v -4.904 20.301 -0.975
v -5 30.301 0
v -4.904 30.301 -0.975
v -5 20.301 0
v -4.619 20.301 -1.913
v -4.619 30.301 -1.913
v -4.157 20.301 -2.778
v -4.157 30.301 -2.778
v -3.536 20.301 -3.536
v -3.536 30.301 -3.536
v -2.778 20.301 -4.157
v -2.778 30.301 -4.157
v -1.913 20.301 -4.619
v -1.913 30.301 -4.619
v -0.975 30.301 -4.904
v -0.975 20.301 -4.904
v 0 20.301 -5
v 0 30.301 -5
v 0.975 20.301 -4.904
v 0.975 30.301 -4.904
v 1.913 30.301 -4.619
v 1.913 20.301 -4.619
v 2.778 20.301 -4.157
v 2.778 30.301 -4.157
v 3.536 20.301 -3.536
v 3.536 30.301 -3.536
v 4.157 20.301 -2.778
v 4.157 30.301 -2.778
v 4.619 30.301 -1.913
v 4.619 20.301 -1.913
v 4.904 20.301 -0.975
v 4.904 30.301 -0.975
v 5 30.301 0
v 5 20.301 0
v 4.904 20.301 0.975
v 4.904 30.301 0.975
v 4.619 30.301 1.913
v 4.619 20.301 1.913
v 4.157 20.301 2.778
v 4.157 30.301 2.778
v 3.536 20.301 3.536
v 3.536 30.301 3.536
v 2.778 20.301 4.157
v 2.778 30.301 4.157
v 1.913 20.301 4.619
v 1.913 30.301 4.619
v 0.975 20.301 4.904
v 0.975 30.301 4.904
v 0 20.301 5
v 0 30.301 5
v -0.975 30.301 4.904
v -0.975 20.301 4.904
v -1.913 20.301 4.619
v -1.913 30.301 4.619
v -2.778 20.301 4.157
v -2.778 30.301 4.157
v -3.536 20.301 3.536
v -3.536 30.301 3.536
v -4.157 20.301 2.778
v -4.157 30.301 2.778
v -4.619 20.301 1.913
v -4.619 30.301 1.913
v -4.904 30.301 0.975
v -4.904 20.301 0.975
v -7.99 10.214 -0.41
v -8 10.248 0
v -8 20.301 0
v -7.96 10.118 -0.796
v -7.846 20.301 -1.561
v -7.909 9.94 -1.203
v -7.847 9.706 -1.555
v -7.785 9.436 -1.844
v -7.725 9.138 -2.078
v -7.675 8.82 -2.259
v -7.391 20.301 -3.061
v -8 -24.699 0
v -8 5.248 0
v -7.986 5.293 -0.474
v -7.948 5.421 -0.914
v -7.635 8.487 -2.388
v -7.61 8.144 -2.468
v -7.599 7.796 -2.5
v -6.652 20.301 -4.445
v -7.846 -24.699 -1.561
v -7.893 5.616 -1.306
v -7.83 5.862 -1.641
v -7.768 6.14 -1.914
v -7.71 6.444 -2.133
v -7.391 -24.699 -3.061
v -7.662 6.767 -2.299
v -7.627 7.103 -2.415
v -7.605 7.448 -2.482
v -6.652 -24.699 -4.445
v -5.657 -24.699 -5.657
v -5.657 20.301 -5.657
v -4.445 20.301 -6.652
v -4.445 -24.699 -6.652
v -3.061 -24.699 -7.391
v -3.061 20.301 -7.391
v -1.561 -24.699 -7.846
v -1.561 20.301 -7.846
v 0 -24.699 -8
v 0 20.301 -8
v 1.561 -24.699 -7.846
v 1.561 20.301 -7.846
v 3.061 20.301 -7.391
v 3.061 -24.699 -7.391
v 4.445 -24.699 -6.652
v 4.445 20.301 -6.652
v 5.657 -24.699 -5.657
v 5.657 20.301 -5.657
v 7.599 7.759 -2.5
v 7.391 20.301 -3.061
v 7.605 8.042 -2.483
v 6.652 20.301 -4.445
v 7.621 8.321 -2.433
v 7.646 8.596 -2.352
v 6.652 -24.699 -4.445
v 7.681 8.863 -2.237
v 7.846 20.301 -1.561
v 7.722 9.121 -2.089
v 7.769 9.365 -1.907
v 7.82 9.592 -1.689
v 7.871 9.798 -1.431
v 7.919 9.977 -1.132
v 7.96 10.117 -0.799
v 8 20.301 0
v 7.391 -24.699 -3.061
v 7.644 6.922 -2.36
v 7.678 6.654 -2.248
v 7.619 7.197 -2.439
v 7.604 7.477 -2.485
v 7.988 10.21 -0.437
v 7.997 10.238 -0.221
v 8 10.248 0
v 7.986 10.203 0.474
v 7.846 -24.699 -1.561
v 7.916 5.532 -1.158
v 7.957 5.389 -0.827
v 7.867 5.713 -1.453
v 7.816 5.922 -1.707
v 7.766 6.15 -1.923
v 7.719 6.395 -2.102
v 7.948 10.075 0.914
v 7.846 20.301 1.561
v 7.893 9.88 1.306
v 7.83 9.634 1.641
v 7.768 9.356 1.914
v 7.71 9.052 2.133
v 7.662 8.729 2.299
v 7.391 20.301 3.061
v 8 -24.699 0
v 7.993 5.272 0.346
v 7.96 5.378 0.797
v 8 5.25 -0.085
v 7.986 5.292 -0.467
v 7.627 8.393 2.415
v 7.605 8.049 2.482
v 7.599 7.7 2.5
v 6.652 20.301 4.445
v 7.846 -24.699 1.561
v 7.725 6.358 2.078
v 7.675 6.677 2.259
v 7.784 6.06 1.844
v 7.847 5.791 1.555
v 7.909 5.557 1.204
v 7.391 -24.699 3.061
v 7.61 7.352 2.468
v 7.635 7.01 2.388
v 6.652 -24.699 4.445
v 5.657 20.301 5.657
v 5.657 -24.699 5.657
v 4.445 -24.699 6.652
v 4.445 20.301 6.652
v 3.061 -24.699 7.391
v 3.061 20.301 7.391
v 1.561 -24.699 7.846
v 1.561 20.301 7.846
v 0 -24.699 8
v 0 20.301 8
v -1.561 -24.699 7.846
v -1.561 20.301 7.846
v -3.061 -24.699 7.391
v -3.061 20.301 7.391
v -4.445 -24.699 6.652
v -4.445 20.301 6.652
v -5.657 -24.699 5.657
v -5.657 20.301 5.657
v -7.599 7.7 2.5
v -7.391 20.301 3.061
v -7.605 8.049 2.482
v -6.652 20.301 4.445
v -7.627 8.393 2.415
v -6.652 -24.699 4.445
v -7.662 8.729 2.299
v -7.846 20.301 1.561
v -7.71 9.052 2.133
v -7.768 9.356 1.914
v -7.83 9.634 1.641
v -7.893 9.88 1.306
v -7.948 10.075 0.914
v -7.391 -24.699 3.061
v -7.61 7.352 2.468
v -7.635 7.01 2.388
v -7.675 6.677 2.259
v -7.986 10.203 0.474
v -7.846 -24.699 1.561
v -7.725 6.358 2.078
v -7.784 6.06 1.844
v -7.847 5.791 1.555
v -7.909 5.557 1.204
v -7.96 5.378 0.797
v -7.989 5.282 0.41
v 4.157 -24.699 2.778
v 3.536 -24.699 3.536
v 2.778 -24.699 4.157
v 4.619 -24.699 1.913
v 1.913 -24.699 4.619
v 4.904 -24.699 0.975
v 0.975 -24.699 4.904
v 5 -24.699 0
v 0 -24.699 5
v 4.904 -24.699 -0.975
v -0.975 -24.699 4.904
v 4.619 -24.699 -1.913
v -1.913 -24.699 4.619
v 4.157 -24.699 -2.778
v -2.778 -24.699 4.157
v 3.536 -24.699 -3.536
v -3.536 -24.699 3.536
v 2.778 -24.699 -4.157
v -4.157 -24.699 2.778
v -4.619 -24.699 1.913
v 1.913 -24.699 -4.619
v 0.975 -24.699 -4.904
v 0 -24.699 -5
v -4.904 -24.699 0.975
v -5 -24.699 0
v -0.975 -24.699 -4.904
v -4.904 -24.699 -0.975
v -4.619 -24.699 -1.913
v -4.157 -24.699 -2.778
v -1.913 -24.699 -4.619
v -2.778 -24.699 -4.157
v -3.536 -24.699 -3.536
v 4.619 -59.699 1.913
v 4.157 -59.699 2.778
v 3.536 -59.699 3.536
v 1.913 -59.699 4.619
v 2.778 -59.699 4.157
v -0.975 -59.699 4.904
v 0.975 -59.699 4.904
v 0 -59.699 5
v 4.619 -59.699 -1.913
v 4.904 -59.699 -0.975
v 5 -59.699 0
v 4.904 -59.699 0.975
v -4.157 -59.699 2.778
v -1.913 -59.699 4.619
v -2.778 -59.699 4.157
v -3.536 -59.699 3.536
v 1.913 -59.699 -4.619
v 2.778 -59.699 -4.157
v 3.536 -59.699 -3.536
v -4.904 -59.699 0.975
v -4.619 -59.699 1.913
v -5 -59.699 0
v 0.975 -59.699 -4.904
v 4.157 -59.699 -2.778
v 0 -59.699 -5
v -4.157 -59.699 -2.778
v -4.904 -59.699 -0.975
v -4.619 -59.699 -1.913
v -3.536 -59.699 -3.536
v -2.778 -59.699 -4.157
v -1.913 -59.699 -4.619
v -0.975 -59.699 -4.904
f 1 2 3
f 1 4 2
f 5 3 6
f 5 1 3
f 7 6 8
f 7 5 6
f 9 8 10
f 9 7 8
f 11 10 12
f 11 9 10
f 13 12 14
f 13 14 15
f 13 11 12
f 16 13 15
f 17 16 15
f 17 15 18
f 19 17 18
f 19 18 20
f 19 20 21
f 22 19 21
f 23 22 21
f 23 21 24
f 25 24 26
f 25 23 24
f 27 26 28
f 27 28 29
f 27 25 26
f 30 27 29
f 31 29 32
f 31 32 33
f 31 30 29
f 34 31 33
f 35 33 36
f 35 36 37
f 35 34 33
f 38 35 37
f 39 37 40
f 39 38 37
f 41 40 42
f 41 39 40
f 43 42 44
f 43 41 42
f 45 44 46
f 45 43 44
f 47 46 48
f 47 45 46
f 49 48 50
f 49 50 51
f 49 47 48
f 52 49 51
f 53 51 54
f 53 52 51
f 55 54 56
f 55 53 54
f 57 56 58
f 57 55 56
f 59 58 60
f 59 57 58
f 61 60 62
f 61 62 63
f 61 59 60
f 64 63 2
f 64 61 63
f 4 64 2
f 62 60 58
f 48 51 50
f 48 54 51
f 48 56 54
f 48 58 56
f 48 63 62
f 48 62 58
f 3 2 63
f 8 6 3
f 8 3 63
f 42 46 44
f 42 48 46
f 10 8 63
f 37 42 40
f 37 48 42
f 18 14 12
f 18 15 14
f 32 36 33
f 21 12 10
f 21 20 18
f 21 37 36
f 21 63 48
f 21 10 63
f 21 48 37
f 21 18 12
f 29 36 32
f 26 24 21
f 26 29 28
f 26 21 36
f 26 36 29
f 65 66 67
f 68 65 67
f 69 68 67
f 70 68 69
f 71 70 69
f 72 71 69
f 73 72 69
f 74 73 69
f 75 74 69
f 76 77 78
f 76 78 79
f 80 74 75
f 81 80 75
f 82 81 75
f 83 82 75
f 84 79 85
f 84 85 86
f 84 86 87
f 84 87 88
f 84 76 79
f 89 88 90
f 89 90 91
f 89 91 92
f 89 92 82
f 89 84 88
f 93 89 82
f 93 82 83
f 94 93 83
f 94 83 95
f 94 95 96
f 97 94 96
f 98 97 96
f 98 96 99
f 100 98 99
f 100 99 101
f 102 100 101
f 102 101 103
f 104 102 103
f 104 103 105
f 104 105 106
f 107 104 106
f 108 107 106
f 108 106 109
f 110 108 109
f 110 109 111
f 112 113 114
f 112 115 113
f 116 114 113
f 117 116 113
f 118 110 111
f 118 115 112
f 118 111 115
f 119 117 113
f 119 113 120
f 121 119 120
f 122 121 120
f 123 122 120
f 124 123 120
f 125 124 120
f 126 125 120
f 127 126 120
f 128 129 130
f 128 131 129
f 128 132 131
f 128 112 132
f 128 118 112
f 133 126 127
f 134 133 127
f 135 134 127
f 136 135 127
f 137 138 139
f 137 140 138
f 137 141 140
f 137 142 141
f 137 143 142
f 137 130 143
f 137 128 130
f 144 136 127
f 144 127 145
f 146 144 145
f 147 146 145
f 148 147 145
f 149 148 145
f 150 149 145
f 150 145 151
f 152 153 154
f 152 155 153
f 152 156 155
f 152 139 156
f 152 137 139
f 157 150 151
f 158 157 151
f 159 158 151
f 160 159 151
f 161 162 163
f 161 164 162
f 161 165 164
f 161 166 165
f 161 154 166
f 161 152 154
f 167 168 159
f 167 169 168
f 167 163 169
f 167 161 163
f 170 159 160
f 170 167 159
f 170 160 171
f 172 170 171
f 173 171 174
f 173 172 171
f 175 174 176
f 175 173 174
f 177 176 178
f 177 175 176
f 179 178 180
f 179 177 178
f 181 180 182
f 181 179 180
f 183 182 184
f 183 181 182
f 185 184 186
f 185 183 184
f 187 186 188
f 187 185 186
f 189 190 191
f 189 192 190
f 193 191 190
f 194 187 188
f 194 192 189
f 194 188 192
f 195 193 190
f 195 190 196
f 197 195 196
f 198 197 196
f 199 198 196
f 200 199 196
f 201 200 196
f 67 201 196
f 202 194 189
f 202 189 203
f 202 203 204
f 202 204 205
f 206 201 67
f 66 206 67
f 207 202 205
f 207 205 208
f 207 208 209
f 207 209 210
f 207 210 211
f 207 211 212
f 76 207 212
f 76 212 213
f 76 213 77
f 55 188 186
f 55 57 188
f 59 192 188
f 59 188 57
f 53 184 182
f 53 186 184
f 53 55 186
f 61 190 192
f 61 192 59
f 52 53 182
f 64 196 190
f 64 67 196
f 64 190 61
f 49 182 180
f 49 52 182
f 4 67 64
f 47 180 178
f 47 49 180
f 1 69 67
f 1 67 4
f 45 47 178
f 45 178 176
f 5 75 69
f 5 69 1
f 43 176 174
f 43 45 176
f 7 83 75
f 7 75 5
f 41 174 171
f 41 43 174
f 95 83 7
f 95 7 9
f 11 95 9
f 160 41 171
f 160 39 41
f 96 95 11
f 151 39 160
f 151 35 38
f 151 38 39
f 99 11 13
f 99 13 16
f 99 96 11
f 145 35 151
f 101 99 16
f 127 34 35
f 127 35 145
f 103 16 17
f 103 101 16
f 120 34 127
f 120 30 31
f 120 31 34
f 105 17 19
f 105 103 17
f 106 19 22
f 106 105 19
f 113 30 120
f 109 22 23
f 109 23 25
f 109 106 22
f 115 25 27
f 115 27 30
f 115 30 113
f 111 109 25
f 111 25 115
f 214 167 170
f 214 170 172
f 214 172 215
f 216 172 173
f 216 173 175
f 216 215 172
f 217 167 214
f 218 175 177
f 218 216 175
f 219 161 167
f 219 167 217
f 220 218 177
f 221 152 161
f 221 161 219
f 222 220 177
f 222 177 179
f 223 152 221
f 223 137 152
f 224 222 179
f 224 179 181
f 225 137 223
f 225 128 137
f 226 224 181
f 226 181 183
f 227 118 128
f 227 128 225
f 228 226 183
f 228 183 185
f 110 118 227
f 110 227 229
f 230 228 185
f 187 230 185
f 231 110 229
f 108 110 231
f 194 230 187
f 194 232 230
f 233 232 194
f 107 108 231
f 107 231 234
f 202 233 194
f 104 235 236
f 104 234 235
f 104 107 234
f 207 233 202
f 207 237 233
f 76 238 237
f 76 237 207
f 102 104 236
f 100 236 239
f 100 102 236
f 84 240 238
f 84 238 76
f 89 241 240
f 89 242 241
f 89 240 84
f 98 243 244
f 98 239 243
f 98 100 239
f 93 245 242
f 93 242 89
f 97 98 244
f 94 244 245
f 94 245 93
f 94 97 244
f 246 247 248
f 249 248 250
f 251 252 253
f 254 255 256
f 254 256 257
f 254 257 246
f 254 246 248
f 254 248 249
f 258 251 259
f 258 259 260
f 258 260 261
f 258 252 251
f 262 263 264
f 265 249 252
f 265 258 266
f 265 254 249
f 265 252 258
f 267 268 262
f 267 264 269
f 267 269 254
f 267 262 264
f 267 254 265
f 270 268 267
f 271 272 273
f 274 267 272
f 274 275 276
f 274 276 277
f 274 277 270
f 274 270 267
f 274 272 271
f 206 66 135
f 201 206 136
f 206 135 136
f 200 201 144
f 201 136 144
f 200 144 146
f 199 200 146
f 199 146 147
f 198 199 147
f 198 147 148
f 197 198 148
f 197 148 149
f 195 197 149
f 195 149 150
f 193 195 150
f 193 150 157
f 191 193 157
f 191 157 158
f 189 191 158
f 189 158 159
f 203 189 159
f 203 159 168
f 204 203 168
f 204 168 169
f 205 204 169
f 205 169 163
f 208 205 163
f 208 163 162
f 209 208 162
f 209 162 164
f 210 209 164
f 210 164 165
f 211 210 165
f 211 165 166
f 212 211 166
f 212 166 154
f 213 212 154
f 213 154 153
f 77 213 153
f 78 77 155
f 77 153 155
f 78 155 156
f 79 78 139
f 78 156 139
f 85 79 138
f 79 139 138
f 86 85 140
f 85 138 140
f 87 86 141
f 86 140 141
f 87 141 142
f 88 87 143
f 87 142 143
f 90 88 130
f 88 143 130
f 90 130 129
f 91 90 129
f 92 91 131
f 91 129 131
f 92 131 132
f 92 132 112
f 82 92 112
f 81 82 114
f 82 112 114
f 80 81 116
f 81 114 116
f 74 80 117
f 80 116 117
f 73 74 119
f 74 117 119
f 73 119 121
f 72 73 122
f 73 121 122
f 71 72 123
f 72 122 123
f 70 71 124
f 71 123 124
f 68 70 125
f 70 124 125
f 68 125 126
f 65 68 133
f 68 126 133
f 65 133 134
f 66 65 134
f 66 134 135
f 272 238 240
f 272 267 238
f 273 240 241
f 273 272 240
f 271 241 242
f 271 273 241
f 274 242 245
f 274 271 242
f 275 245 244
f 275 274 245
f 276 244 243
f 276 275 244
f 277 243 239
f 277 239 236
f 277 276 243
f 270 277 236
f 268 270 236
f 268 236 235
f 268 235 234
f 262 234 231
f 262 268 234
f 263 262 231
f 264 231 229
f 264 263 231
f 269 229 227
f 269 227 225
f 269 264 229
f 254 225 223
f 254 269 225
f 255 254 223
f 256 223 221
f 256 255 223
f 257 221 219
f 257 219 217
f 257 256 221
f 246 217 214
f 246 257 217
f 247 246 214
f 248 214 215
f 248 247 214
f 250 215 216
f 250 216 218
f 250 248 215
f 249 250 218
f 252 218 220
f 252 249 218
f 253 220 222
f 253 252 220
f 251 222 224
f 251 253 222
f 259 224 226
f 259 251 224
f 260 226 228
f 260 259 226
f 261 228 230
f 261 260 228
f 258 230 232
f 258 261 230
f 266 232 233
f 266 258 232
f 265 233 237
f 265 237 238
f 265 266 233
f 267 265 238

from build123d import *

# Parameters (mm, degrees)
F3_R     = 2.5
F4_DEPTH = 45


with BuildPart() as f1:
    # F0 (on Top) → F1 (revolve)
    with BuildSketch(Plane.XY):
        Polygon((0, -59.698787), (0, 30.301213), (-5, 30.301213), (-5, 20.301213), (-8, 20.301213), (-8, -24.698787), (-5, -24.698787), (-5, -59.698787), align=None)
    revolve(axis=Axis((0, -14.698787, 0), (0, -1, 0)))

    # F3 (on offset) → F4 (cut)
    with BuildSketch(Plane.YZ.offset(25)):
        with Locations((7.748153, 0)):
            Circle(F3_R)
    extrude(amount=-F4_DEPTH, mode=Mode.SUBTRACT)


solid = f1.part
